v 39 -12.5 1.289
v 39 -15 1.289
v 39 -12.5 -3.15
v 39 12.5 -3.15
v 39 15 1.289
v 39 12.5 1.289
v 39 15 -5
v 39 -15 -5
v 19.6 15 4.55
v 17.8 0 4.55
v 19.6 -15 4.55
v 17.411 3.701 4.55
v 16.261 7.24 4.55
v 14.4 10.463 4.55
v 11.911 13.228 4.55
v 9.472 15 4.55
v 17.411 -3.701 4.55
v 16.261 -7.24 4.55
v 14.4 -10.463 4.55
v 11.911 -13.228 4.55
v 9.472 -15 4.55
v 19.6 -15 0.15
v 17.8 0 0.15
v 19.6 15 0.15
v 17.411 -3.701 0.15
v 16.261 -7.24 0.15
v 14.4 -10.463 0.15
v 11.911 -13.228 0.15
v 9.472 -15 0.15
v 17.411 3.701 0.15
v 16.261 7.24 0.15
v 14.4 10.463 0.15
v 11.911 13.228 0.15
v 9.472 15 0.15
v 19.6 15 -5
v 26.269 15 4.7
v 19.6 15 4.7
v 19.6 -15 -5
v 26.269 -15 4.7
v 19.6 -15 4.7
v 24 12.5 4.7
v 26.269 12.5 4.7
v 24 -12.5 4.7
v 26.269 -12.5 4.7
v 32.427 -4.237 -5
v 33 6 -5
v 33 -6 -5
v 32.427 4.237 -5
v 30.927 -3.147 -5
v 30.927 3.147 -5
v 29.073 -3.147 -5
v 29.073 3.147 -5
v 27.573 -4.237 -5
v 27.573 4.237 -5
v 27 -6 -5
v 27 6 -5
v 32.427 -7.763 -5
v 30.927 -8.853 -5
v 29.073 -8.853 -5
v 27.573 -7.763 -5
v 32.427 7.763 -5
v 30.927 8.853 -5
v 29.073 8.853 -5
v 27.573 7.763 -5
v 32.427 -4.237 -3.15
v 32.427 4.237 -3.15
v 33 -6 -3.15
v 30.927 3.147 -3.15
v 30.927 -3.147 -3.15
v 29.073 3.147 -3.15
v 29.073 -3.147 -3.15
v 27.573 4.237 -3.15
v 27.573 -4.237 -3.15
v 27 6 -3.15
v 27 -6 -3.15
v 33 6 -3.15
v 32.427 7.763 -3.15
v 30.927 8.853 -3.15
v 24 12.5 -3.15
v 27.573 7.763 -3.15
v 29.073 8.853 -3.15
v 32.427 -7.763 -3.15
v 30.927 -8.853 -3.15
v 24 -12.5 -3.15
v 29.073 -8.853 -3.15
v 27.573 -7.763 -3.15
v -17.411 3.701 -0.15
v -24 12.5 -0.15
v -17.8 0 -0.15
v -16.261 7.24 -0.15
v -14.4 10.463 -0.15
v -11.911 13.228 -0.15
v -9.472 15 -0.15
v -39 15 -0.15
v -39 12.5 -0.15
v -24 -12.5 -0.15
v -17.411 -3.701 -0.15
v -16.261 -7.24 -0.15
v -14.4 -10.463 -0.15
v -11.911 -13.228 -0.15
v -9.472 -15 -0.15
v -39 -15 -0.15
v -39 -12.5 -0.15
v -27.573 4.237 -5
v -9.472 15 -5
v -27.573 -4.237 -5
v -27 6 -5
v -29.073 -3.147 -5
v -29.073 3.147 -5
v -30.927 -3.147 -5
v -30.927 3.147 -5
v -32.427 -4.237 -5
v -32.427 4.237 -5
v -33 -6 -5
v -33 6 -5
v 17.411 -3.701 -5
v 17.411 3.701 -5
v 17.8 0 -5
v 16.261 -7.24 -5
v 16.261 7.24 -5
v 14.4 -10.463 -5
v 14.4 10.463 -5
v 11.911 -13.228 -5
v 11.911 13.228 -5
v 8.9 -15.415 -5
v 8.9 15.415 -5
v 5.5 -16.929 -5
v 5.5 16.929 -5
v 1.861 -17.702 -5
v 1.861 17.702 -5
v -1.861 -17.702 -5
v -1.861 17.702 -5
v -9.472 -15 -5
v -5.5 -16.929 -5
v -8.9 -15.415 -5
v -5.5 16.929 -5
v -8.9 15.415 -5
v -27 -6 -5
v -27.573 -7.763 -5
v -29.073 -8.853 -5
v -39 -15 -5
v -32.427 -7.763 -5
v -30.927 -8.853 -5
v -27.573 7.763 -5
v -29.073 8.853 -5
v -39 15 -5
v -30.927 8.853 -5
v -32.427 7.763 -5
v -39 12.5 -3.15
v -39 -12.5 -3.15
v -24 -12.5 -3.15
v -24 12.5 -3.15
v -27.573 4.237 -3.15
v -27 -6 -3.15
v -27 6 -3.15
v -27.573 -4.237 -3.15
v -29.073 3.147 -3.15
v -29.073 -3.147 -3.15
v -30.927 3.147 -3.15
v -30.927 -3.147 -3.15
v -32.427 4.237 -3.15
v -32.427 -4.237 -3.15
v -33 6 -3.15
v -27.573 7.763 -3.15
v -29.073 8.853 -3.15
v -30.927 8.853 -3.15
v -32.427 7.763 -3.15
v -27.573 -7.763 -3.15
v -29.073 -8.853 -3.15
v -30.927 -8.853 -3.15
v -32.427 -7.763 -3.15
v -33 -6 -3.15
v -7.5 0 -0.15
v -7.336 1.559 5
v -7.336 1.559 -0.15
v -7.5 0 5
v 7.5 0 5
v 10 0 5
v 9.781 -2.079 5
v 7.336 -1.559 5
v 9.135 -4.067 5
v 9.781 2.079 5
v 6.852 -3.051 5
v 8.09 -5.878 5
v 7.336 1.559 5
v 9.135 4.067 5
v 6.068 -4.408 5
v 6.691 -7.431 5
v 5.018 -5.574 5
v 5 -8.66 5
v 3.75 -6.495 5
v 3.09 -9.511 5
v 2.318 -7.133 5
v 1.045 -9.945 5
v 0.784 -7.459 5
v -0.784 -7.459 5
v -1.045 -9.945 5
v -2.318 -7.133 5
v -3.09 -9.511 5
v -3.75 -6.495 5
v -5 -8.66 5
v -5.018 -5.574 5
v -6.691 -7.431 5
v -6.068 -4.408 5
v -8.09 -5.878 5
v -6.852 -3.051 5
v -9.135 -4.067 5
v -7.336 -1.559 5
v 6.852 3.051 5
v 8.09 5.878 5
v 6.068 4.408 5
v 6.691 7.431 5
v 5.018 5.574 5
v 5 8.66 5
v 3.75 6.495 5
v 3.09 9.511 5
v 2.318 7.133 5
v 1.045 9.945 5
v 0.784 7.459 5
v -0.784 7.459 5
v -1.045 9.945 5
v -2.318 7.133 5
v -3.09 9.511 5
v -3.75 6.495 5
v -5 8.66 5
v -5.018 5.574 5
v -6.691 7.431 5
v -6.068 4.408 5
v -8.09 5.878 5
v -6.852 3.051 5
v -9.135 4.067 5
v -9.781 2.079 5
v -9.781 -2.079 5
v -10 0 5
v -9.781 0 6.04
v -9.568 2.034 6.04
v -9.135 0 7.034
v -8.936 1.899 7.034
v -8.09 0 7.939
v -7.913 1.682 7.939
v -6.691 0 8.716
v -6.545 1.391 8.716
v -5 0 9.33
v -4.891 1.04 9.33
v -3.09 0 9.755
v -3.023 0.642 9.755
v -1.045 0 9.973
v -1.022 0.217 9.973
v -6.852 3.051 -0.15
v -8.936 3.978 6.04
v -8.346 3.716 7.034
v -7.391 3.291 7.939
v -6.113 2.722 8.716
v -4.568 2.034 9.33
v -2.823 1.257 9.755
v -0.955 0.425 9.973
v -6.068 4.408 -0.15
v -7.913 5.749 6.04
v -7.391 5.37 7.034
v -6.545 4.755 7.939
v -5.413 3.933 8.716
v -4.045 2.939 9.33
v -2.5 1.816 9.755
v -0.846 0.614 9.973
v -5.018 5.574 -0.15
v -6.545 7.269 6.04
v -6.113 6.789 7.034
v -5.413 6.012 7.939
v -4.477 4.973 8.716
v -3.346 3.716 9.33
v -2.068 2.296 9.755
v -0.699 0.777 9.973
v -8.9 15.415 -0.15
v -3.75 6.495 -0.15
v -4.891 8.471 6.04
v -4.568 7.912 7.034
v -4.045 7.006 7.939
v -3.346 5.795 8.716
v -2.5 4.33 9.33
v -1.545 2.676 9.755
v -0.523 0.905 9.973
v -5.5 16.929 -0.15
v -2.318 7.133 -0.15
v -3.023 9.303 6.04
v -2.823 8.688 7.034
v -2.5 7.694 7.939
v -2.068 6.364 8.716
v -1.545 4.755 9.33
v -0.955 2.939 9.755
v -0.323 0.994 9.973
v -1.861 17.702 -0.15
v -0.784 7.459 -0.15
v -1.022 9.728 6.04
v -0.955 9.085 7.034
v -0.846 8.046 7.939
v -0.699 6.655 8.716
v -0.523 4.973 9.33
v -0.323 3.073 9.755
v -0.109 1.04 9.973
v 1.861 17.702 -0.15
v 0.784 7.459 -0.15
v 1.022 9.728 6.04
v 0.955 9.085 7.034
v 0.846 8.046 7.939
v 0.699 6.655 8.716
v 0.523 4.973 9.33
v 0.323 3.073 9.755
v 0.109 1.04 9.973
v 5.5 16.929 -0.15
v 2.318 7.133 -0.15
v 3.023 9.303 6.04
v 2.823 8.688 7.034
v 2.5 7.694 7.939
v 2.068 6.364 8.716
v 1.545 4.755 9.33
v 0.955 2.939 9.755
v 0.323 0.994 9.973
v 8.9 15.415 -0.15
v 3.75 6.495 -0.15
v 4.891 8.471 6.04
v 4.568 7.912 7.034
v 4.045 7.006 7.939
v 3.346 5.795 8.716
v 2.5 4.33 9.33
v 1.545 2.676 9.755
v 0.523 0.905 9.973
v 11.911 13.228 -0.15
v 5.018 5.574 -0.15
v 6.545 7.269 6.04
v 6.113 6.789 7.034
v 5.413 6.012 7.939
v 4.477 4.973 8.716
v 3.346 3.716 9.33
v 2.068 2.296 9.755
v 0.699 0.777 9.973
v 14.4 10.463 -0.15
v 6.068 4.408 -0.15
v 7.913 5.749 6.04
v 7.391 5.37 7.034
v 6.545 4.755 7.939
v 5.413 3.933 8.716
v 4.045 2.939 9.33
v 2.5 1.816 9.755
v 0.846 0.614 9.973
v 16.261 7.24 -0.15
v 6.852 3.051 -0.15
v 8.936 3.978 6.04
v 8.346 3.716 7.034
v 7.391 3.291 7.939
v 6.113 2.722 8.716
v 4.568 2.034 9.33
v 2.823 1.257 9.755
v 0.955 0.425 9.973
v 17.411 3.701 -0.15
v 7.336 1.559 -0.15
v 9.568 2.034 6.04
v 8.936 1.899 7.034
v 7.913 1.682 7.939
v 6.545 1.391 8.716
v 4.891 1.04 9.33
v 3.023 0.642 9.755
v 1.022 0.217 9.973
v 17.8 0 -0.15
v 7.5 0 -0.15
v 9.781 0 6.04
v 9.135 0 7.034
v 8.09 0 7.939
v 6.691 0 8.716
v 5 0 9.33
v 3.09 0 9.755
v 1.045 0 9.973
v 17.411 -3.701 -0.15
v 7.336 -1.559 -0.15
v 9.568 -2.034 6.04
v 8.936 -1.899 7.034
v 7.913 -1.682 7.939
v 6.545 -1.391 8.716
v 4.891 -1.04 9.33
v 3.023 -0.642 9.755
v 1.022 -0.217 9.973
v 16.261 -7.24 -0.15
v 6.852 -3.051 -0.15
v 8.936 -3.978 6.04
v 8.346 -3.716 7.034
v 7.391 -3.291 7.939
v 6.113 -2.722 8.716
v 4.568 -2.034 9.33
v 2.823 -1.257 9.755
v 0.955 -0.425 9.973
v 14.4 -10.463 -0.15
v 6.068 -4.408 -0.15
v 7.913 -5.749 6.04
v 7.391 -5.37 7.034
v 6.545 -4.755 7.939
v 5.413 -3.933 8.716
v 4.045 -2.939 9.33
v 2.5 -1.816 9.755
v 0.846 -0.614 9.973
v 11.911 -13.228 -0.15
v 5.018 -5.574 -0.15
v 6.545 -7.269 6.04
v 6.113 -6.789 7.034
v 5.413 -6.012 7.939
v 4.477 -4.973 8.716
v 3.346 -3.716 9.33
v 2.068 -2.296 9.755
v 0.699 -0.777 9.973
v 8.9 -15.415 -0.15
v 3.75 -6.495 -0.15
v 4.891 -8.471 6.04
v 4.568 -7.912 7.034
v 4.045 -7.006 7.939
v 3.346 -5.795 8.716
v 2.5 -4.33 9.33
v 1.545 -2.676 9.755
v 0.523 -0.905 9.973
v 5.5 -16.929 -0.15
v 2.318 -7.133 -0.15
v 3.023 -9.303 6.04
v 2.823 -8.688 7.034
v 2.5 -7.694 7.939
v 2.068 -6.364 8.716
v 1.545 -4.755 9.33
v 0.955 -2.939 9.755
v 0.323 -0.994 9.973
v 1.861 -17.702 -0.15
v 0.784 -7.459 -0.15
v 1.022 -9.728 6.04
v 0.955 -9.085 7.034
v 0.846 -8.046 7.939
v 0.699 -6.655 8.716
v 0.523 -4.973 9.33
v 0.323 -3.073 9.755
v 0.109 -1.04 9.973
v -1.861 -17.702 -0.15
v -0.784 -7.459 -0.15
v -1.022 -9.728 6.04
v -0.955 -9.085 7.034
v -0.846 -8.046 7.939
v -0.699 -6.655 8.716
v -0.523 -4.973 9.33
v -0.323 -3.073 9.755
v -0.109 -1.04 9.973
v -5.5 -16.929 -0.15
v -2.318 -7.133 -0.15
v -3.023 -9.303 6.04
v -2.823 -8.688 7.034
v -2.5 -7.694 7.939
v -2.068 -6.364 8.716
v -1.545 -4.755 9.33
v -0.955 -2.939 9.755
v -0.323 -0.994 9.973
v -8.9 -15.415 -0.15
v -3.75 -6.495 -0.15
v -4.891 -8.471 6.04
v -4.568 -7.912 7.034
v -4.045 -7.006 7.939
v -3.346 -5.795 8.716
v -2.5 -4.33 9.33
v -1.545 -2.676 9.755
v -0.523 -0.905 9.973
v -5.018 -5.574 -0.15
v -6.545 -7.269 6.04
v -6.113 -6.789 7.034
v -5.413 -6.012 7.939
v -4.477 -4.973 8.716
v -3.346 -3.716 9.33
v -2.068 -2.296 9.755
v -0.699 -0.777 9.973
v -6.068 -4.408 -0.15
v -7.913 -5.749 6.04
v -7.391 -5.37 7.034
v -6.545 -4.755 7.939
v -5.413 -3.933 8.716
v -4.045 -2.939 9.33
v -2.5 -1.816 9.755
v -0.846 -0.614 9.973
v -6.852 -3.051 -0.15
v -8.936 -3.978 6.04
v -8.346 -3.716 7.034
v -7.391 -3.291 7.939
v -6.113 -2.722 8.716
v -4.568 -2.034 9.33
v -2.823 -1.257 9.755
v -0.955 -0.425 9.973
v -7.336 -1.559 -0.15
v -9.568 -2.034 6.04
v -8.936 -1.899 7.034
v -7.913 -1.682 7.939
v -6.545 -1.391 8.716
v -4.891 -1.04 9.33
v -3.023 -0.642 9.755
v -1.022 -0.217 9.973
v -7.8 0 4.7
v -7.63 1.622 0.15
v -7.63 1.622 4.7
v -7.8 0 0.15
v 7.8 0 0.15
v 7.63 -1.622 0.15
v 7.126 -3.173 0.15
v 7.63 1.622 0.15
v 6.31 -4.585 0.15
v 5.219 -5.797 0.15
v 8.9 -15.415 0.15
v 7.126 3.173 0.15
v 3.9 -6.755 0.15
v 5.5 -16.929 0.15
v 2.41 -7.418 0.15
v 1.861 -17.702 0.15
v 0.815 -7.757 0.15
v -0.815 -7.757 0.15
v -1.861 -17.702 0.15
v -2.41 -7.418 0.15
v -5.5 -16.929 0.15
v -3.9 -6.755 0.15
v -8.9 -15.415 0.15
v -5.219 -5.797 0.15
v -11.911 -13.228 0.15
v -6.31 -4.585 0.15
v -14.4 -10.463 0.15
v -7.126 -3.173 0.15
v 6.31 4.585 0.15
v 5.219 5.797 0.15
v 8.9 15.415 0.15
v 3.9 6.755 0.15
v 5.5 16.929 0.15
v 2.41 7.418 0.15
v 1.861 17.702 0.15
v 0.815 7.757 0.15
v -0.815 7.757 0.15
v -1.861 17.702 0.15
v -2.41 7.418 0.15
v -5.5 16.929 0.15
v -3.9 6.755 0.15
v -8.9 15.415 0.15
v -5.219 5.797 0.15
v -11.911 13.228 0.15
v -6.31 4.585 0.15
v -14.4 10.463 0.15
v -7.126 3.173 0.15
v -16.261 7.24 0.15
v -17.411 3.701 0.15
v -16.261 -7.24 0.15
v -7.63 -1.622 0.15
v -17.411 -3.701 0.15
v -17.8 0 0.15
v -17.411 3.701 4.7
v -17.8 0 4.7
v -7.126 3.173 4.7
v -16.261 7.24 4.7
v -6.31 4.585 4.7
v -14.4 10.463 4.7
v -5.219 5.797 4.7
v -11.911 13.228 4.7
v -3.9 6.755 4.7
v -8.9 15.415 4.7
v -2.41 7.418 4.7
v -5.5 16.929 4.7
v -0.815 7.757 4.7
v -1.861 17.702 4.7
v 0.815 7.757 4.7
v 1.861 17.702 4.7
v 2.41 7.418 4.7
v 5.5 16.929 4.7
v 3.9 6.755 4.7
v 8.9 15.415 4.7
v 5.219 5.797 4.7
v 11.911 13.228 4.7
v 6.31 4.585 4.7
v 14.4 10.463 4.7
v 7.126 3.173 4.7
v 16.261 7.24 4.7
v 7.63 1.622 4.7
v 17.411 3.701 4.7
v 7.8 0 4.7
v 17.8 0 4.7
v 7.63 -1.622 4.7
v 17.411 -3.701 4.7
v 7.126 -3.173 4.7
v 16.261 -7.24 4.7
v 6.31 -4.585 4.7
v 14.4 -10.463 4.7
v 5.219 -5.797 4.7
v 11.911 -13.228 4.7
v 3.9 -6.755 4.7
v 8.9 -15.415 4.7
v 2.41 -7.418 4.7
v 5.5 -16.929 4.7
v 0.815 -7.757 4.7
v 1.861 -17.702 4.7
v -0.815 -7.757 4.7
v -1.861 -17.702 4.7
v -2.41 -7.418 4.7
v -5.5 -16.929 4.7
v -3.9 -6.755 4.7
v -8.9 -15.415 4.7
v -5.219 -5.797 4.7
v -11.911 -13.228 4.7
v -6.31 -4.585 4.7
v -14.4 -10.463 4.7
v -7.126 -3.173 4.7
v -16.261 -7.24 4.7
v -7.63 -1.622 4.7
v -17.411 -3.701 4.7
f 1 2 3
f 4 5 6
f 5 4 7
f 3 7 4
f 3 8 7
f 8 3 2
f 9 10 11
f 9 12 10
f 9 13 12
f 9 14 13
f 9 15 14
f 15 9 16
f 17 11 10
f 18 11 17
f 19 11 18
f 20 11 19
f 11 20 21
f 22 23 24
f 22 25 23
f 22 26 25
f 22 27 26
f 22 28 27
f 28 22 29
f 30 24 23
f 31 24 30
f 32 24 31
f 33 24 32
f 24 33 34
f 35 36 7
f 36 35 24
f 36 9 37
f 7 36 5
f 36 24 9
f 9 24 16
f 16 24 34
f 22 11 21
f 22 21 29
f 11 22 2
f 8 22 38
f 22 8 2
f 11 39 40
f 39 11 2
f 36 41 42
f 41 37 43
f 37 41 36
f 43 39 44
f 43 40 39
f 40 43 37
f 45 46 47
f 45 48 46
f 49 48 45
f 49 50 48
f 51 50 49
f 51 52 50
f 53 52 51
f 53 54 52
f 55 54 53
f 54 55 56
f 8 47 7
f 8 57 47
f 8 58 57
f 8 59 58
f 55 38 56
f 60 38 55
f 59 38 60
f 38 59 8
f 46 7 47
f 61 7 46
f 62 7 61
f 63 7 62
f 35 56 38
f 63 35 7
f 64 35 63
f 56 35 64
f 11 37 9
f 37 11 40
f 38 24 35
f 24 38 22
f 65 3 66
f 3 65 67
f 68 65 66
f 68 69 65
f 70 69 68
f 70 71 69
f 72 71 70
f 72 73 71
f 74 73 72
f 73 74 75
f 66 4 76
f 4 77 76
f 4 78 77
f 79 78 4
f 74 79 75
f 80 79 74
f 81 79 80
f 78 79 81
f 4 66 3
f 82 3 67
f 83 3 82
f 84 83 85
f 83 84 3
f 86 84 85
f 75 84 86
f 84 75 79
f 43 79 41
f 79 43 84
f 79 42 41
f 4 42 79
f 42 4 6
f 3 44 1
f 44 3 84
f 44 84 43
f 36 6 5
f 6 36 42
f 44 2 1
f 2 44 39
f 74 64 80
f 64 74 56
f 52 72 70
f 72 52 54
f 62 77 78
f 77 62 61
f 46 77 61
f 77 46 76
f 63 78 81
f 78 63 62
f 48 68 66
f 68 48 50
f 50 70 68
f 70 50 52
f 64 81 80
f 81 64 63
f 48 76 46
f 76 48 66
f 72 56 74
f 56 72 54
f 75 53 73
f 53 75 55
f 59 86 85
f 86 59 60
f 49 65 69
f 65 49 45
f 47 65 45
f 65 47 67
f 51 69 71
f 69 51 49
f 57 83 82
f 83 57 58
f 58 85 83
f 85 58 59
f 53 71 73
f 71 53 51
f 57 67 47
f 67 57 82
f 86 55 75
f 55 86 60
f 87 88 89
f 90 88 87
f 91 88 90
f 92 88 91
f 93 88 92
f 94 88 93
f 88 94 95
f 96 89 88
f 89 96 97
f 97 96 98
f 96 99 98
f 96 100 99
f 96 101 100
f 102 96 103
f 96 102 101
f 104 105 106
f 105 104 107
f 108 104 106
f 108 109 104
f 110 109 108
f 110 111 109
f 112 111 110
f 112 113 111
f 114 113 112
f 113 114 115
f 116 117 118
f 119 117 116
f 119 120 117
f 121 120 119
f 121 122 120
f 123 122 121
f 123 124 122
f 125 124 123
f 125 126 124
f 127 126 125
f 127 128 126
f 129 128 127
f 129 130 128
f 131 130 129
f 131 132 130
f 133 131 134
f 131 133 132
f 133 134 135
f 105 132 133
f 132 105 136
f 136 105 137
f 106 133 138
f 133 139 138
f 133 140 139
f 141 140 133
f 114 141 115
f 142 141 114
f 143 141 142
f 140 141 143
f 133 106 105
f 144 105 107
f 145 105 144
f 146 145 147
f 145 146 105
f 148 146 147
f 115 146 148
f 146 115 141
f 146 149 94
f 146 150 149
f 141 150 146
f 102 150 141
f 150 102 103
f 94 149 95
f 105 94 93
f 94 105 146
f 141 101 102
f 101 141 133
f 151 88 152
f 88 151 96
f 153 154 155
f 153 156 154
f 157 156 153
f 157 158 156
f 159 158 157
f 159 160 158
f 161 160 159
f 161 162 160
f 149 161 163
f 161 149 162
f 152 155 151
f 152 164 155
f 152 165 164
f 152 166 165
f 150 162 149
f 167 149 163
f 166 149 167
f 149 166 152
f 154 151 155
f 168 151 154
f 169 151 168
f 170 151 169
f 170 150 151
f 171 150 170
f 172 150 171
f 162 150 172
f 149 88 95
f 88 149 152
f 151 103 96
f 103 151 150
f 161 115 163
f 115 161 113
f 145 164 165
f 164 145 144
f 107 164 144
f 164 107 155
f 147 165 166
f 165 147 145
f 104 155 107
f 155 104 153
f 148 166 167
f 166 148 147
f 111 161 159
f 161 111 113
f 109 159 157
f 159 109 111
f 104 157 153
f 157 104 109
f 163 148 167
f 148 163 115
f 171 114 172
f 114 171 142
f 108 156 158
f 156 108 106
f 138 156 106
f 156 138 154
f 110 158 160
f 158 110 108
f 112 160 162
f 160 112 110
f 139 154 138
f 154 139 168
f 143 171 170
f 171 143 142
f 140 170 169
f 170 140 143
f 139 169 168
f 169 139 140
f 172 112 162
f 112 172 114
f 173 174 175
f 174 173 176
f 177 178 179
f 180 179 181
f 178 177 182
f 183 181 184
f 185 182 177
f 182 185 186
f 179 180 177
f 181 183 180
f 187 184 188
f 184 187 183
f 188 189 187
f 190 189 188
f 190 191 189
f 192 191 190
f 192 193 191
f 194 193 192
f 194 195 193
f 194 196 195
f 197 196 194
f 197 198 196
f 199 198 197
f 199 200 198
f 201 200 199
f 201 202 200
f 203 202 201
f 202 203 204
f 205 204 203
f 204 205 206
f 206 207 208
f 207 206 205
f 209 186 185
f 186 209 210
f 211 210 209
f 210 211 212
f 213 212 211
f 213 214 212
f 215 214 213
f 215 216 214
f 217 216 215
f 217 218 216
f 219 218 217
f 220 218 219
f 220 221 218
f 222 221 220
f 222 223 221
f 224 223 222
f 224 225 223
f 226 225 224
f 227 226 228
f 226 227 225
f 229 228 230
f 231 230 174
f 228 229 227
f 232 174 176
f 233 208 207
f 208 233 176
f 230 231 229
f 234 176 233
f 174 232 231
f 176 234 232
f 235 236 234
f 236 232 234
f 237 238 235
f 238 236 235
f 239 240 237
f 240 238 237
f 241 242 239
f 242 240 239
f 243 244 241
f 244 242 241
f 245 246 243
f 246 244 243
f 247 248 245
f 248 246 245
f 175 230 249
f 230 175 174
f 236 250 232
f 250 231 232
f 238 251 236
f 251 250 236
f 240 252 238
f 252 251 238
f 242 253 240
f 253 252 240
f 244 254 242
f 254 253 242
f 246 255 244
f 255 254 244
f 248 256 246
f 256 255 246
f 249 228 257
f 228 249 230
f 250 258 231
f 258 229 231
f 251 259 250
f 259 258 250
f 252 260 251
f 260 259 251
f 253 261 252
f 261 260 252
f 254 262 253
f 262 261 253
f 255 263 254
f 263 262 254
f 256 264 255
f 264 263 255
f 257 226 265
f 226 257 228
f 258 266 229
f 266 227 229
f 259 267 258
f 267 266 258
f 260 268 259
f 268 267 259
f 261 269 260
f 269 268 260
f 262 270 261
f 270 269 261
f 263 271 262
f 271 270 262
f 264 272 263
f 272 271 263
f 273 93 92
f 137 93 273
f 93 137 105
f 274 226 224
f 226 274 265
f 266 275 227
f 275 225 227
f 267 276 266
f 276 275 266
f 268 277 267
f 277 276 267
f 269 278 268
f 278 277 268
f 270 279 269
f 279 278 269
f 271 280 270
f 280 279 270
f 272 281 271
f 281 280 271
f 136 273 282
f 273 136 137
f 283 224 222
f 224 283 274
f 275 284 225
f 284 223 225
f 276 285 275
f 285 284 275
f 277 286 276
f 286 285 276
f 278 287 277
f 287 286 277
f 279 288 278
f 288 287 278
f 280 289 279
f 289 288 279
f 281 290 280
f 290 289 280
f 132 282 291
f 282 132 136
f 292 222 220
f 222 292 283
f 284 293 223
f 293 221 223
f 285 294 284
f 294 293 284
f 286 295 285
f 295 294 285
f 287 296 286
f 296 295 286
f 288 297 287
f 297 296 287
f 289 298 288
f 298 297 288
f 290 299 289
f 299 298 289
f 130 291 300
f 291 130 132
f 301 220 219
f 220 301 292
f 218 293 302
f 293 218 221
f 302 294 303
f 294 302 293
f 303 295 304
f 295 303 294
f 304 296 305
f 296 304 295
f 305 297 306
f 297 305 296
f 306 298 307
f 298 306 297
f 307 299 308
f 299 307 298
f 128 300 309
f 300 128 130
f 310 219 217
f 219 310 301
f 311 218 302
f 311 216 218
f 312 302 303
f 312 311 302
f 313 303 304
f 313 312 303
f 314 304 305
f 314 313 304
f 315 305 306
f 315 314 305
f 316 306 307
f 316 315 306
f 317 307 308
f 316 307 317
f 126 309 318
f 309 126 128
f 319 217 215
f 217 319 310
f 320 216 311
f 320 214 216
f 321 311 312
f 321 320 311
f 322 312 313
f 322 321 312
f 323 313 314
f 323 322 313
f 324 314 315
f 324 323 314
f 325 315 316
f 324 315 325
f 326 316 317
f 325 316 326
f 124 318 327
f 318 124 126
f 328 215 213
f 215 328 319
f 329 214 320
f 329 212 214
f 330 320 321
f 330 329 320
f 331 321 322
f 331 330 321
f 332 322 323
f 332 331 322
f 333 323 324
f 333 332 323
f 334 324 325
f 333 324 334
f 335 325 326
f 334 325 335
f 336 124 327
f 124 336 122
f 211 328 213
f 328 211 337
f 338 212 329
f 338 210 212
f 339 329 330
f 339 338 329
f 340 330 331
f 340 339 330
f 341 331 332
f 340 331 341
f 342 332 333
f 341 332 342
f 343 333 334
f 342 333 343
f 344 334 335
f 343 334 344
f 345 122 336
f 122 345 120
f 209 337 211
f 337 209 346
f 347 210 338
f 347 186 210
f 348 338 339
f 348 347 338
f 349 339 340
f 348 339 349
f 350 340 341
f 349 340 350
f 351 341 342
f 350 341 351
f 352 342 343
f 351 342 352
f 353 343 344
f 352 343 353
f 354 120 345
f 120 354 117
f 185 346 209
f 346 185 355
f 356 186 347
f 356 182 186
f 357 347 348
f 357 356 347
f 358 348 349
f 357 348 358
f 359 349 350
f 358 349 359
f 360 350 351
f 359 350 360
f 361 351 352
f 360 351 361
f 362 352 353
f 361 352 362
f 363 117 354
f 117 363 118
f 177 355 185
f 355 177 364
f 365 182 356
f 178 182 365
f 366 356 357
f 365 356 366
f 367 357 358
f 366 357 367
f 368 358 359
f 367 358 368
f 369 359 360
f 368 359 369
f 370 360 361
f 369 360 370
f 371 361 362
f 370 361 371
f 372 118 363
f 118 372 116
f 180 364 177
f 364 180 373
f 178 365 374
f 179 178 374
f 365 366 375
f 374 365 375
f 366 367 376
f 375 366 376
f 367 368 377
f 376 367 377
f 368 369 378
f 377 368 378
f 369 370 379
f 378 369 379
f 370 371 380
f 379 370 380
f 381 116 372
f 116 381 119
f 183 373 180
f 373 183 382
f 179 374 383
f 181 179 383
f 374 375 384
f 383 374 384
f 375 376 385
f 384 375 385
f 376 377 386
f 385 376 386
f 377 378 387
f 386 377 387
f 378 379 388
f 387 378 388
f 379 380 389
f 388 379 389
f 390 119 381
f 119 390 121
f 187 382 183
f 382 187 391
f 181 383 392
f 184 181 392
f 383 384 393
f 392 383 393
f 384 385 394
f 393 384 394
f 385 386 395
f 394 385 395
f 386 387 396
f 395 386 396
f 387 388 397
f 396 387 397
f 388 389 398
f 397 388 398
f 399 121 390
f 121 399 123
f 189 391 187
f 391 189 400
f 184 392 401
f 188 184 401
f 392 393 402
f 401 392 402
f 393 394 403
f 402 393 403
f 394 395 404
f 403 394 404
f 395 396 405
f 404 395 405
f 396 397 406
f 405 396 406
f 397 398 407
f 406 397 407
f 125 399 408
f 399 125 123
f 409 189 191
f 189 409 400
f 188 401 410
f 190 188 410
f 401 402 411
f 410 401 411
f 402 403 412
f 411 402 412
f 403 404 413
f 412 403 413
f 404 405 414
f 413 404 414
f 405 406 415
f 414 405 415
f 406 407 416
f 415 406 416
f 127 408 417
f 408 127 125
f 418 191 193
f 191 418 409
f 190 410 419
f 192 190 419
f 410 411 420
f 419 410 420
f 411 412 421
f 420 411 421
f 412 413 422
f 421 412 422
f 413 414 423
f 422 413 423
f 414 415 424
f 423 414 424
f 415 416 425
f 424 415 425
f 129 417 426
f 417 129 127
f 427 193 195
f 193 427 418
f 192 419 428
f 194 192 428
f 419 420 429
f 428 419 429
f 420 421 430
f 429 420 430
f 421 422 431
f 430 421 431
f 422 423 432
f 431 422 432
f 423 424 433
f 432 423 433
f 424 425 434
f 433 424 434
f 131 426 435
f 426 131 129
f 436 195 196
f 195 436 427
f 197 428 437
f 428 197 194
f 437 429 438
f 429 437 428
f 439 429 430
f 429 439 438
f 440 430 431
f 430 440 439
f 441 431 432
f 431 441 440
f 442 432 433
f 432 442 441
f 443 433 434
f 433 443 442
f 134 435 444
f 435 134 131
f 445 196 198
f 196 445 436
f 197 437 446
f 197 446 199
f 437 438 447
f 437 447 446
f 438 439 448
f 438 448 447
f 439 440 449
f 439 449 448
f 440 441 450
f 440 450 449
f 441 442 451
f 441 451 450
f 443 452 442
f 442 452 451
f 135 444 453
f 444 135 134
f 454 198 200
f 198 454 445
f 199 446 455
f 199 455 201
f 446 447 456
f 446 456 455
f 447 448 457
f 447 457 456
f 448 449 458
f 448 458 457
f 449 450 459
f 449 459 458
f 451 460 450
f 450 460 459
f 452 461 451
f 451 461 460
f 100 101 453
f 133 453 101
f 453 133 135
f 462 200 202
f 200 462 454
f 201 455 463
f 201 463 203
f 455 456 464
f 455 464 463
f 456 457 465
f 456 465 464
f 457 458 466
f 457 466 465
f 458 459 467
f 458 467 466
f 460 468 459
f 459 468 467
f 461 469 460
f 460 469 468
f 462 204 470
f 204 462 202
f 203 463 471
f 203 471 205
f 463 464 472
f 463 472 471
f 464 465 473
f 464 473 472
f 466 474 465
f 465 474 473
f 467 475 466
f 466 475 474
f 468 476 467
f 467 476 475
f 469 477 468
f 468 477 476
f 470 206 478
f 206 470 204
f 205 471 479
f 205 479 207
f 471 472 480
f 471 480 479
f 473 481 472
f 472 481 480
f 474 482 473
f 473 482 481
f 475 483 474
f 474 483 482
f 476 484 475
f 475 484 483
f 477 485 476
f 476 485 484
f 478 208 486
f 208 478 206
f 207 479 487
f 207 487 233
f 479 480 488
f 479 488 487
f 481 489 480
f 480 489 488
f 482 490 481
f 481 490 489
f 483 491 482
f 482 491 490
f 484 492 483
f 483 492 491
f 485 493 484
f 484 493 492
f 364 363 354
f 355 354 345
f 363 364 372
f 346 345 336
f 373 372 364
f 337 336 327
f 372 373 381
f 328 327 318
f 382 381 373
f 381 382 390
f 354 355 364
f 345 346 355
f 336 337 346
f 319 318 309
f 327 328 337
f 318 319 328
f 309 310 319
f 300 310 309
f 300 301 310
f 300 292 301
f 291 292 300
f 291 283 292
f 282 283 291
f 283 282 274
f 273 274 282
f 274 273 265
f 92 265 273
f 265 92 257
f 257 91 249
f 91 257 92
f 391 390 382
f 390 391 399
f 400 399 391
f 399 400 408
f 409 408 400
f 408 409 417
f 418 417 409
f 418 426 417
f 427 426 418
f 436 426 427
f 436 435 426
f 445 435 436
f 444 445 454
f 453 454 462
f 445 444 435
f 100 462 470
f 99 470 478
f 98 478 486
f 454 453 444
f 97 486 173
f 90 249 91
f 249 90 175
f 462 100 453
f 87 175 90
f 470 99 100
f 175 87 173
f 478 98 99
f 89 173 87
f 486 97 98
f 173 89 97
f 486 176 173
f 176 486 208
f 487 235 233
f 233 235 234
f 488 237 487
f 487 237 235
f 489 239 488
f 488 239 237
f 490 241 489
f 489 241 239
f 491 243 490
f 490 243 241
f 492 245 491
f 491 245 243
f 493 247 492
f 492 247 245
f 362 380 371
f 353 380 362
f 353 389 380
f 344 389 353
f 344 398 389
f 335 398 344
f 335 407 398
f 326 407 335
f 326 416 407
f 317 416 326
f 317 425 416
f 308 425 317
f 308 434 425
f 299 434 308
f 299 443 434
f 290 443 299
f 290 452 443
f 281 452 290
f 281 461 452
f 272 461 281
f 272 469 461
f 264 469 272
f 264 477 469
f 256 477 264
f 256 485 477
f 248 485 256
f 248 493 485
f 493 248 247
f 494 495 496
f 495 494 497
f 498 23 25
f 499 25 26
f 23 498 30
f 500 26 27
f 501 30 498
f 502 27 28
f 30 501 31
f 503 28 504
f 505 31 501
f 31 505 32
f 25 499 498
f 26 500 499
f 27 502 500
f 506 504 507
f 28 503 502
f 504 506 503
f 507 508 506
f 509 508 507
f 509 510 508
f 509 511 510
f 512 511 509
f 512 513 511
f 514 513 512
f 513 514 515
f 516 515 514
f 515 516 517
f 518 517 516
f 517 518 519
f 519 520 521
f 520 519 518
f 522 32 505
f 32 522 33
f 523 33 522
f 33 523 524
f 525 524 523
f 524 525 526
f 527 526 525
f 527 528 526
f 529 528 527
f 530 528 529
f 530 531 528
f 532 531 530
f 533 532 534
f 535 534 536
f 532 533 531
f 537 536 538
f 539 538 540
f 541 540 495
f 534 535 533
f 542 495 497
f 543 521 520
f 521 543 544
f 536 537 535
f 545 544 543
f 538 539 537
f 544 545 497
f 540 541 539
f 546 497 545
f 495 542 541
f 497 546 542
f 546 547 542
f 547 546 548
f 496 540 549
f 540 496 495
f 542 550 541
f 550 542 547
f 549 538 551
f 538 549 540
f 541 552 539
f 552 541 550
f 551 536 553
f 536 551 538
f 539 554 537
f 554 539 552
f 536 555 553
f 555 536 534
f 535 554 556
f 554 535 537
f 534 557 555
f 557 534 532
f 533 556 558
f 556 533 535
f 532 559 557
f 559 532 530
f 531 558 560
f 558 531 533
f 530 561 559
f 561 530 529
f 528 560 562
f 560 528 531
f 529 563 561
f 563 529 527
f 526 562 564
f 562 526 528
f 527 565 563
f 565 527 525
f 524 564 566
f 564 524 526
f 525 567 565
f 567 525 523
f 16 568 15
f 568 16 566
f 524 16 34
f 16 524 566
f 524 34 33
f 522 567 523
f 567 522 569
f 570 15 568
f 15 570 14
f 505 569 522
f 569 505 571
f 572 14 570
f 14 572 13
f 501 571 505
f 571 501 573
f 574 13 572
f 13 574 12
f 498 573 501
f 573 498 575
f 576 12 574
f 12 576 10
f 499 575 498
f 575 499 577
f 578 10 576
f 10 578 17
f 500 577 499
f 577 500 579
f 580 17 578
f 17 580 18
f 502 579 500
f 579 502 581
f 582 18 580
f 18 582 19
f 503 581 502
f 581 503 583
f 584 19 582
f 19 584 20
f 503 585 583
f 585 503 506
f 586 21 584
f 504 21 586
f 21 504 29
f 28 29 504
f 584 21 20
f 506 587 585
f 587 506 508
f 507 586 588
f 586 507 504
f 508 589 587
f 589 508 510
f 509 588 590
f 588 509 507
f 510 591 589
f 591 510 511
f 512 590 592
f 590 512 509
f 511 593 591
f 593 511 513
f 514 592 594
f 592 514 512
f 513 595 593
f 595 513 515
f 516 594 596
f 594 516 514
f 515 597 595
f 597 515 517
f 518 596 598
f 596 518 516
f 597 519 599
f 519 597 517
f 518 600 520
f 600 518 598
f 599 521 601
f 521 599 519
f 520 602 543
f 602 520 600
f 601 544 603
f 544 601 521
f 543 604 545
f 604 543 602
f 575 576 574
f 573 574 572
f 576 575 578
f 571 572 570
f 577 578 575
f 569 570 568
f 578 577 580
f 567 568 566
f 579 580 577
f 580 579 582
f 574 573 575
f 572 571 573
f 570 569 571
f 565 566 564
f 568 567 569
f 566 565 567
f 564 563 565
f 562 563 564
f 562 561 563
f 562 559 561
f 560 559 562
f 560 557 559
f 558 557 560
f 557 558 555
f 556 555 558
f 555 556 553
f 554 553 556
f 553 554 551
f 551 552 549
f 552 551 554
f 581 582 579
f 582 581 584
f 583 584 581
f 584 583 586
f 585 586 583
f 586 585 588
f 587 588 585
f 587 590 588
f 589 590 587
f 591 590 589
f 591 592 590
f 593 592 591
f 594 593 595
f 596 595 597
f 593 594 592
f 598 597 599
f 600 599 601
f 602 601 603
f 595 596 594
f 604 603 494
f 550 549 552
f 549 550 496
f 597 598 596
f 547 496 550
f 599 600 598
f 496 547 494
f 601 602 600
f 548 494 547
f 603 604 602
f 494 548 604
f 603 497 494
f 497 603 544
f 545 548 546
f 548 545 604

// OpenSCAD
E = 0.001;

// Parameters

bone_thickness = 3;
bone_width = 25;

joint_plug_r = 15;
joint_ring_width = 10;
joint_height = 10;
joint_gap = 0.3;

// Bones and their parts

module bone_manus() {
    length = 100;
    cube([
        length,
        bone_width,
        bone_thickness,
    ]);
}

module bone_ulna() {
    length = 270;
    cube([
        length,
        bone_width,
        bone_thickness,
    ]);
}

module bone_humerus() {
    length = 350;
    cube([
        length,
        bone_width,
        bone_thickness,
    ]);
}

module bones() {
    translate([0, 100, 0])
        bone_manus();

    translate([0, 50, 0])
        bone_ulna();

    bone_humerus();
};

// Joints and their parts

module joint_2d_slice_half() {
    translate([0, joint_height / 2])
    intersection() {
        scale([1, 0.5])
            circle(joint_ring_width);
        square([joint_ring_width, joint_height]);
    }

    polygon([
        [0, 0],
        [0, -joint_height / 2],
        [joint_plug_r / 2 + joint_gap + joint_ring_width, - joint_height / 2],
        [joint_plug_r / 2 + joint_gap + joint_ring_width, - joint_gap / 2],
        [joint_plug_r / 2, - joint_gap / 2],
        [joint_plug_r / 2, joint_height / 2 + joint_gap],
        [0, joint_height / 2 + joint_gap],
    ]);

    polygon([
        [joint_plug_r / 2 + joint_gap, joint_gap / 2],
        [joint_plug_r / 2 + joint_gap + joint_ring_width, joint_gap / 2],
        [joint_plug_r / 2 + joint_gap + joint_ring_width, joint_height / 2 - joint_gap],
        [joint_plug_r / 2 + joint_gap, joint_height / 2 - joint_gap],
    ]);
}

module joint_joiners() {
    extent = 30;
    wall_width = 5;
    hole_r = 3;

    width = bone_width + wall_width;

    // Top joiner

    difference() {

        union() {
            translate([joint_plug_r * 0.6, - width / 2, joint_gap / 2])
                cube([extent, width, joint_height / 2 - joint_gap * 2]);

            translate([
                joint_plug_r * 0.6 + joint_ring_width + joint_gap * 2,
                - width / 2,
                - joint_height / 2,
            ])
                cube([extent - joint_ring_width - joint_gap * 2, width, joint_height - joint_gap]);
        }

        // Cutout
        translate([
            joint_plug_r * 0.6 + extent * 0.5,
            - bone_width / 2,
            - bone_thickness - joint_gap / 2,
        ])
            #cube([
                extent,
                bone_width,
                joint_height,
            ]);

        // Unsharpen edges
        translate([0, 0, joint_height * 1.5])
        scale([1, 2, 1])
        rotate([0, 15, 0])
        translate([
            joint_plug_r * 0.6 + extent * 0.5,
            - bone_width / 2,
            - bone_thickness - joint_gap / 2,
        ])
            cube([
                extent,
                bone_width,
                joint_height,
            ]);

        // Mounting holes

        translate([
            joint_plug_r * 0.6 + extent * 0.5 + hole_r * 2,
            hole_r * 2,
            - bone_thickness - joint_gap / 2,
        ])
        #cylinder(joint_height, r = hole_r, center = true);

        translate([
            joint_plug_r * 0.6 + extent * 0.5 + hole_r * 2,
            - hole_r * 2,
            - bone_thickness - joint_gap / 2,
        ])
        #cylinder(joint_height, r = hole_r, center = true);
    }

    // Bottom joiner

    difference() {

        translate([- joint_plug_r * 0.6 - extent, - width / 2, - joint_height / 2])
            cube([extent, width, joint_height / 2 - joint_gap / 2]);

        // Cutout
        translate([
            - joint_plug_r * 0.6 - extent * 1.5,
            - bone_width / 2,
            - bone_thickness - joint_gap / 2,
        ])
            #cube([
                extent,
                bone_width,
                joint_height,
            ]);

        // Mounting holes

        translate([
            - joint_plug_r * 0.6 - extent * 0.5 - hole_r * 2,
            hole_r * 2,
            - bone_thickness - joint_gap / 2,
        ])
        #cylinder(joint_height, r = hole_r, center = true);

        translate([
            - joint_plug_r * 0.6 - extent * 0.5 - hole_r * 2,
            - hole_r * 2,
            - bone_thickness - joint_gap / 2,
        ])
        #cylinder(joint_height, r = hole_r, center = true);

    }
}

module joint_wrist() {
    rotate_extrude()
        joint_2d_slice_half();
    joint_joiners();
}

module joint_elbow() {
    rotate_extrude()
        joint_2d_slice_half();
    joint_joiners();

}

module joint_shoulder() {
    rotate_extrude()
        joint_2d_slice_half();
    joint_joiners();

}

module joints() {
    translate([-100, 100, 0])
        joint_wrist();
    translate([-100, 50, 0])
        joint_elbow();
    translate([-100, 0, 0])
        joint_shoulder();
}

// joint_2d_slice_half();

// bones();
// joints();

joint_shoulder();
